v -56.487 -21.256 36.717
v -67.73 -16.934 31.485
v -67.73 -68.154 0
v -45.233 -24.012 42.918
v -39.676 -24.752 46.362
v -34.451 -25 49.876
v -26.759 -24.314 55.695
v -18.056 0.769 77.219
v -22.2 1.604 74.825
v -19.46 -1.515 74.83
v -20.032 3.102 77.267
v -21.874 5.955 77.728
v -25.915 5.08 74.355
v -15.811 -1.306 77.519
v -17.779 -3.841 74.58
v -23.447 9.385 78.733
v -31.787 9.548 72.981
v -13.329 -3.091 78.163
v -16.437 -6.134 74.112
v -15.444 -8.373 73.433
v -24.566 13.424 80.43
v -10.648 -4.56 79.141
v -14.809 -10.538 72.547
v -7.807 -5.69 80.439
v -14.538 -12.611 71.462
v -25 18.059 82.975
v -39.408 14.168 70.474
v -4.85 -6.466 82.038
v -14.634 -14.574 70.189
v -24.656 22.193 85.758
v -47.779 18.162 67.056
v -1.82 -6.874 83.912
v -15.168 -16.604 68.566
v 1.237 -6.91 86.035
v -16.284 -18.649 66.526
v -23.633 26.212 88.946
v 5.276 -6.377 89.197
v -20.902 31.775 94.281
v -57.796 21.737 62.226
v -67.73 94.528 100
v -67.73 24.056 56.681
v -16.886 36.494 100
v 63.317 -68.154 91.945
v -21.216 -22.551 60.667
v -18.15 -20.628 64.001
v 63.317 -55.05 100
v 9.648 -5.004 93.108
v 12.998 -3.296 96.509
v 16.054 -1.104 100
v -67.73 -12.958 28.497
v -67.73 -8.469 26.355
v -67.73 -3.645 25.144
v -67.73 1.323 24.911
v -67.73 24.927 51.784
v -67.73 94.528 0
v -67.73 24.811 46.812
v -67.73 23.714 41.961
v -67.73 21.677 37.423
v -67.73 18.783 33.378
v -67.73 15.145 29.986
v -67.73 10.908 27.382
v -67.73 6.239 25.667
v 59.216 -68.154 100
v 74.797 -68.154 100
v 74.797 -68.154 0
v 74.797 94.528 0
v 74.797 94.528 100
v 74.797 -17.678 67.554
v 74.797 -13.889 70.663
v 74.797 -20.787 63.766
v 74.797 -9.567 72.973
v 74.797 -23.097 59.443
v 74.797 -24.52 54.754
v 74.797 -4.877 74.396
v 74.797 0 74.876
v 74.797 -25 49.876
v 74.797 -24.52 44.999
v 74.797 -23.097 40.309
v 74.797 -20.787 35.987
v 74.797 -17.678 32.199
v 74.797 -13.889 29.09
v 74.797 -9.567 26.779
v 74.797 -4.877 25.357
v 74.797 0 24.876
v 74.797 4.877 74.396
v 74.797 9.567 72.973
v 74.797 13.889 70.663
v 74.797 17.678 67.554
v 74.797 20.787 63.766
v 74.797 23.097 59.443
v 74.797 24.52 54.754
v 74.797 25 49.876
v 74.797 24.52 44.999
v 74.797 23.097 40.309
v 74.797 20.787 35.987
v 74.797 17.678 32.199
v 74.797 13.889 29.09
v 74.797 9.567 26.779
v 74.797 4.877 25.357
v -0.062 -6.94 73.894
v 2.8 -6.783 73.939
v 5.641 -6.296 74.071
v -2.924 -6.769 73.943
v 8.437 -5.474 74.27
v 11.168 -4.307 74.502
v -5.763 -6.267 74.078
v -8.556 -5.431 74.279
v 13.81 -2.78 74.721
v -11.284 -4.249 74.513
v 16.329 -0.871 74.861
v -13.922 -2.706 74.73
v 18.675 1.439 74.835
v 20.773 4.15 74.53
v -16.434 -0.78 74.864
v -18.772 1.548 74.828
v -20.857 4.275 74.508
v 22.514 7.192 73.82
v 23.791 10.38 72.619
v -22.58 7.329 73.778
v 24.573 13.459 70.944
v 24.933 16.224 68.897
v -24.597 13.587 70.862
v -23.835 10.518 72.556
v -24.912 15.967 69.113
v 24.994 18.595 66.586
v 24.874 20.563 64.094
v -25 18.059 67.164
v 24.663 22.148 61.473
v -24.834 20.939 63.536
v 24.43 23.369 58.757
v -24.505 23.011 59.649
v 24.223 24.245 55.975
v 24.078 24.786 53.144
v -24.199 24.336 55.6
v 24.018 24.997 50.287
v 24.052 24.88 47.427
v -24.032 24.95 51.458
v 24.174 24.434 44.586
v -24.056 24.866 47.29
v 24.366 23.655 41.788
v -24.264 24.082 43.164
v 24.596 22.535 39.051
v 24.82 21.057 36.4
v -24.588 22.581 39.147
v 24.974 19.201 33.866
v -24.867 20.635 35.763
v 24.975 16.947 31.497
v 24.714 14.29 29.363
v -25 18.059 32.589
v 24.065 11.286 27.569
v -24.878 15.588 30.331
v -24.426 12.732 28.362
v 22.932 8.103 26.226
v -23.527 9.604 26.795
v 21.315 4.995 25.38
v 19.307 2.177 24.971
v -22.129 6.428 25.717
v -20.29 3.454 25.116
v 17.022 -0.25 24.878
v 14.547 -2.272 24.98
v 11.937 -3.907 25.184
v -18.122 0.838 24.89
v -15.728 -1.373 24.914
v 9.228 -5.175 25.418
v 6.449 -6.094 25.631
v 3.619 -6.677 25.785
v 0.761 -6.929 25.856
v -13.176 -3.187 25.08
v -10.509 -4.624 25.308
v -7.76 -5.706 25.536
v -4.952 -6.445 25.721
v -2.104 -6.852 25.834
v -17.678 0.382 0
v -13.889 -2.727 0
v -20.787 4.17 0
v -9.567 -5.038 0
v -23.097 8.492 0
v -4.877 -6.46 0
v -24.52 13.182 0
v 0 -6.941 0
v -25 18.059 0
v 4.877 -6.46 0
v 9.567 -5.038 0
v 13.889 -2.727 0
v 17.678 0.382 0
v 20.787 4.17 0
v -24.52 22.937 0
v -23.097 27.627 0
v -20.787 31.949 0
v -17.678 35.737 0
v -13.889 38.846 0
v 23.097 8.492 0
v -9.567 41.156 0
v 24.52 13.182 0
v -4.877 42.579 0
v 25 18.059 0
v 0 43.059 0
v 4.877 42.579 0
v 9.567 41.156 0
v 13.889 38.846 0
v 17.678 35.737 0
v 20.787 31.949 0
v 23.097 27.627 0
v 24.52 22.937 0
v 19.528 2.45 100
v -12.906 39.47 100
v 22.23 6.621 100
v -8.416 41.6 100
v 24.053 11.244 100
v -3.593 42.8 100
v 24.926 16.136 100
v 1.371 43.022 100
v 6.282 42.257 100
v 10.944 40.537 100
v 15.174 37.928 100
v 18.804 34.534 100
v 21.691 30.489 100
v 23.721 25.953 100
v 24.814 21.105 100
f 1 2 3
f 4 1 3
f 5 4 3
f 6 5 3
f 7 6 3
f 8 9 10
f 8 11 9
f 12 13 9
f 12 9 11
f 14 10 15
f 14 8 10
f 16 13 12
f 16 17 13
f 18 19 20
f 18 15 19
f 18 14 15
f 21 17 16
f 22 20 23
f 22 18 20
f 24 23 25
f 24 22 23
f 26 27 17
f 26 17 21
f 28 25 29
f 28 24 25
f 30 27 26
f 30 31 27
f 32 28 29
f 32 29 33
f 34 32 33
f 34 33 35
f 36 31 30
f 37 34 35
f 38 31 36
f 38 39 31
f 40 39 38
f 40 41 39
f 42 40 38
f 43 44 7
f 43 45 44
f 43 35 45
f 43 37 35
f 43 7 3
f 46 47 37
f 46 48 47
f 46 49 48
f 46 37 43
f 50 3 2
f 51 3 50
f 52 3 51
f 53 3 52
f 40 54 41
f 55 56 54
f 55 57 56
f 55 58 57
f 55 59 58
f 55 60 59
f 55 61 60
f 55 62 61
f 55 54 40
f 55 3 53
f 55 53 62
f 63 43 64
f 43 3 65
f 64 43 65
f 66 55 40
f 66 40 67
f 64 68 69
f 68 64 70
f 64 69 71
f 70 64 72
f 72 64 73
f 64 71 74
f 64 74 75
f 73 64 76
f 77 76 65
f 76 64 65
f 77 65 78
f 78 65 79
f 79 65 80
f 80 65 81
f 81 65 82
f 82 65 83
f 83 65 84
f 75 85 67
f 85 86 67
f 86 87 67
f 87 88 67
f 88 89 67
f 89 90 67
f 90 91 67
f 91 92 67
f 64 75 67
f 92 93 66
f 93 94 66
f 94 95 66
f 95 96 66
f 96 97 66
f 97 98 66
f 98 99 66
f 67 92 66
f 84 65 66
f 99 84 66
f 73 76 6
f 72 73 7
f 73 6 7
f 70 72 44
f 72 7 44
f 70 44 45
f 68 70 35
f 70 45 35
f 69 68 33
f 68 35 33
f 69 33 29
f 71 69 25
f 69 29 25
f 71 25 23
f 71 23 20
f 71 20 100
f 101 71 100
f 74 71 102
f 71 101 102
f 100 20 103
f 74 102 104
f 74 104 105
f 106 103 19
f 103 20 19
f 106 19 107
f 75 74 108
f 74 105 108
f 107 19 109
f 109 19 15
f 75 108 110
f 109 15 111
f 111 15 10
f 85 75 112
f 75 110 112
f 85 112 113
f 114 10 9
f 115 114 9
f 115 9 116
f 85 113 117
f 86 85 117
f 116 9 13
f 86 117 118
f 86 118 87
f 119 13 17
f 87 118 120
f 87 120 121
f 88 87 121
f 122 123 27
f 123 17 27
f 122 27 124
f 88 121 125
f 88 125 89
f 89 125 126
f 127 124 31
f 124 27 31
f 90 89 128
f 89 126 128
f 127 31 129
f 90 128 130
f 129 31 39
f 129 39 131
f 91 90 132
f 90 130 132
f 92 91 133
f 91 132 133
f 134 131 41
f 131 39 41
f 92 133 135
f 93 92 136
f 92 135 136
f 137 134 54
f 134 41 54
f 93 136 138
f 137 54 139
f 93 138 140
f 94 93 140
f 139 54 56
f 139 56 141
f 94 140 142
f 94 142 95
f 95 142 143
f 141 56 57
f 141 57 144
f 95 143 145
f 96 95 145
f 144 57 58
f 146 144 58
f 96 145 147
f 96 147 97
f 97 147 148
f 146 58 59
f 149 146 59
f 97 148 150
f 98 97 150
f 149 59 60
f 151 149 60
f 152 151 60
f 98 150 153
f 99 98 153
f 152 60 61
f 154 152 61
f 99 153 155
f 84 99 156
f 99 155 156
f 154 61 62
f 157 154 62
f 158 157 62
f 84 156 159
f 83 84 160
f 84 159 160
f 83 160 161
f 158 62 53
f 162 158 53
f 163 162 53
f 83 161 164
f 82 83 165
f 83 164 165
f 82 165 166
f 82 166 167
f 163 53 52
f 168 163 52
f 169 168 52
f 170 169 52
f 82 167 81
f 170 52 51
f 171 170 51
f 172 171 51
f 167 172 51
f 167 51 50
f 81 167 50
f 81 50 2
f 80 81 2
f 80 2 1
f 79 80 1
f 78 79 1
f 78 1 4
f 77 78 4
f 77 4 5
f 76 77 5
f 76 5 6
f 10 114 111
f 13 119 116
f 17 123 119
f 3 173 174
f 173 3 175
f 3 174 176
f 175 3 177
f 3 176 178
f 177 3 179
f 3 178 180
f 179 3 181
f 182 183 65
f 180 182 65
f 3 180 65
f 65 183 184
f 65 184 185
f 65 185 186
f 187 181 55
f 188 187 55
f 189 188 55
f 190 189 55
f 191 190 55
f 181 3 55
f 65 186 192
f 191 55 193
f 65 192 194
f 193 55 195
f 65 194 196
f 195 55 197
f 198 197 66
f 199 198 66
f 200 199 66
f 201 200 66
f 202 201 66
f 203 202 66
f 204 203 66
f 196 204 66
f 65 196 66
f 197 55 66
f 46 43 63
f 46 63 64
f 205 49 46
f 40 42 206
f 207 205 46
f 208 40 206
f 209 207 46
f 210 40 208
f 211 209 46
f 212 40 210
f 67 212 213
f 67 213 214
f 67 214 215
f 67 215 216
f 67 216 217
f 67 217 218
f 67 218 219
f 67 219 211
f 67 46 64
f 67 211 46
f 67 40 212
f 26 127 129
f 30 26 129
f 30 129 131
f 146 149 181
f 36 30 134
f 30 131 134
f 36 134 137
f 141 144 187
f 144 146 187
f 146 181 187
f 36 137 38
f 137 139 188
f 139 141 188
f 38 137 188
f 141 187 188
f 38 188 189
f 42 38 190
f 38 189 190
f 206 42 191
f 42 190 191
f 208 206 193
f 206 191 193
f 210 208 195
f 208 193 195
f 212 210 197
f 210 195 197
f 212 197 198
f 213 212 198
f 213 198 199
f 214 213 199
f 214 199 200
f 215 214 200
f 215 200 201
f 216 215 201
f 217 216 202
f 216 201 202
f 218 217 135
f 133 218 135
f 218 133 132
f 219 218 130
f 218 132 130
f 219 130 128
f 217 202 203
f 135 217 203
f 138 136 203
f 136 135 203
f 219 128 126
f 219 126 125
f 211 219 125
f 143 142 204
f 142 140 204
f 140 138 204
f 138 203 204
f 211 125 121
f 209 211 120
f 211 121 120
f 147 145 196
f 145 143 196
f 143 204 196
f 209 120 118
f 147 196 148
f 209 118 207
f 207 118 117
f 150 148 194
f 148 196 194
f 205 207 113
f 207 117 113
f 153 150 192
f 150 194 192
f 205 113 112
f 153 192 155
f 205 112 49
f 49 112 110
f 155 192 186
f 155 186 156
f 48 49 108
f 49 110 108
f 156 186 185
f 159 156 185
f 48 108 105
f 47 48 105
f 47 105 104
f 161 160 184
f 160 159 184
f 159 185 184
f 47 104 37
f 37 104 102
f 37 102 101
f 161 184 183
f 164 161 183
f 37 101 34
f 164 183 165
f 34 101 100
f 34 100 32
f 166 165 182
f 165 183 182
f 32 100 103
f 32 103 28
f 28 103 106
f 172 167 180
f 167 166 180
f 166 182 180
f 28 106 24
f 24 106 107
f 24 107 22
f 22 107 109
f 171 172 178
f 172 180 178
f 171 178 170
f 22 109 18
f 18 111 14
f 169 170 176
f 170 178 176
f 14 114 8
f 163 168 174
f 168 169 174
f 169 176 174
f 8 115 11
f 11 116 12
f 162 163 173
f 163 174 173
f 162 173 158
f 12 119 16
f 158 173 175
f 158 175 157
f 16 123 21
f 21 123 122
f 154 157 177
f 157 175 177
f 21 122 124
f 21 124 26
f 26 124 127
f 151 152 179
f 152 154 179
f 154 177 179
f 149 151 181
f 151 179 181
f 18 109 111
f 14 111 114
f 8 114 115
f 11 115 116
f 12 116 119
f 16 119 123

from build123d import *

# Parameters (mm, degrees)
F0_W     = 142.5278559327
F0_H     = 162.6823693514
F1_DEPTH = 100
F3_D     = 50
F5_D     = 50
F7_W     = 217.2406986356
F7_H     = 260.2855265141
F8_DEPTH = 100


with BuildPart() as f1:
    # F0 (on Top) → F1 (new body)
    with BuildSketch(Plane.XY):
        with Locations((3.5334713757, 13.1870955229)):
            Rectangle(F0_W, F0_H)
    extrude(amount=F1_DEPTH)

    # F3 (through all)
    with Locations(Plane.XY.offset(100)):
        with Locations((0, 18.059482798)):
            Hole(F3_D / 2)

    # F5 (through all)
    with Locations(Plane.YZ.offset(74.7973993421)):
        with Locations((0, 49.8763620853)):
            Hole(F5_D / 2)

    # F7 (on 3pt) → F8 (cut)
    with BuildSketch(Plane(origin=(-33.5460278912, -29.390052834, 47.8124343039), x_dir=(0.8583543186, -0.2686733101, 0.4370841066), z_dir=(-0.5130573689, -0.449495339, 0.7312496676))):
        with Locations((4.2272098362, 30.3416997194)):
            Rectangle(F7_W, F7_H)
    extrude(amount=F8_DEPTH, mode=Mode.SUBTRACT)


solid = f1.part
